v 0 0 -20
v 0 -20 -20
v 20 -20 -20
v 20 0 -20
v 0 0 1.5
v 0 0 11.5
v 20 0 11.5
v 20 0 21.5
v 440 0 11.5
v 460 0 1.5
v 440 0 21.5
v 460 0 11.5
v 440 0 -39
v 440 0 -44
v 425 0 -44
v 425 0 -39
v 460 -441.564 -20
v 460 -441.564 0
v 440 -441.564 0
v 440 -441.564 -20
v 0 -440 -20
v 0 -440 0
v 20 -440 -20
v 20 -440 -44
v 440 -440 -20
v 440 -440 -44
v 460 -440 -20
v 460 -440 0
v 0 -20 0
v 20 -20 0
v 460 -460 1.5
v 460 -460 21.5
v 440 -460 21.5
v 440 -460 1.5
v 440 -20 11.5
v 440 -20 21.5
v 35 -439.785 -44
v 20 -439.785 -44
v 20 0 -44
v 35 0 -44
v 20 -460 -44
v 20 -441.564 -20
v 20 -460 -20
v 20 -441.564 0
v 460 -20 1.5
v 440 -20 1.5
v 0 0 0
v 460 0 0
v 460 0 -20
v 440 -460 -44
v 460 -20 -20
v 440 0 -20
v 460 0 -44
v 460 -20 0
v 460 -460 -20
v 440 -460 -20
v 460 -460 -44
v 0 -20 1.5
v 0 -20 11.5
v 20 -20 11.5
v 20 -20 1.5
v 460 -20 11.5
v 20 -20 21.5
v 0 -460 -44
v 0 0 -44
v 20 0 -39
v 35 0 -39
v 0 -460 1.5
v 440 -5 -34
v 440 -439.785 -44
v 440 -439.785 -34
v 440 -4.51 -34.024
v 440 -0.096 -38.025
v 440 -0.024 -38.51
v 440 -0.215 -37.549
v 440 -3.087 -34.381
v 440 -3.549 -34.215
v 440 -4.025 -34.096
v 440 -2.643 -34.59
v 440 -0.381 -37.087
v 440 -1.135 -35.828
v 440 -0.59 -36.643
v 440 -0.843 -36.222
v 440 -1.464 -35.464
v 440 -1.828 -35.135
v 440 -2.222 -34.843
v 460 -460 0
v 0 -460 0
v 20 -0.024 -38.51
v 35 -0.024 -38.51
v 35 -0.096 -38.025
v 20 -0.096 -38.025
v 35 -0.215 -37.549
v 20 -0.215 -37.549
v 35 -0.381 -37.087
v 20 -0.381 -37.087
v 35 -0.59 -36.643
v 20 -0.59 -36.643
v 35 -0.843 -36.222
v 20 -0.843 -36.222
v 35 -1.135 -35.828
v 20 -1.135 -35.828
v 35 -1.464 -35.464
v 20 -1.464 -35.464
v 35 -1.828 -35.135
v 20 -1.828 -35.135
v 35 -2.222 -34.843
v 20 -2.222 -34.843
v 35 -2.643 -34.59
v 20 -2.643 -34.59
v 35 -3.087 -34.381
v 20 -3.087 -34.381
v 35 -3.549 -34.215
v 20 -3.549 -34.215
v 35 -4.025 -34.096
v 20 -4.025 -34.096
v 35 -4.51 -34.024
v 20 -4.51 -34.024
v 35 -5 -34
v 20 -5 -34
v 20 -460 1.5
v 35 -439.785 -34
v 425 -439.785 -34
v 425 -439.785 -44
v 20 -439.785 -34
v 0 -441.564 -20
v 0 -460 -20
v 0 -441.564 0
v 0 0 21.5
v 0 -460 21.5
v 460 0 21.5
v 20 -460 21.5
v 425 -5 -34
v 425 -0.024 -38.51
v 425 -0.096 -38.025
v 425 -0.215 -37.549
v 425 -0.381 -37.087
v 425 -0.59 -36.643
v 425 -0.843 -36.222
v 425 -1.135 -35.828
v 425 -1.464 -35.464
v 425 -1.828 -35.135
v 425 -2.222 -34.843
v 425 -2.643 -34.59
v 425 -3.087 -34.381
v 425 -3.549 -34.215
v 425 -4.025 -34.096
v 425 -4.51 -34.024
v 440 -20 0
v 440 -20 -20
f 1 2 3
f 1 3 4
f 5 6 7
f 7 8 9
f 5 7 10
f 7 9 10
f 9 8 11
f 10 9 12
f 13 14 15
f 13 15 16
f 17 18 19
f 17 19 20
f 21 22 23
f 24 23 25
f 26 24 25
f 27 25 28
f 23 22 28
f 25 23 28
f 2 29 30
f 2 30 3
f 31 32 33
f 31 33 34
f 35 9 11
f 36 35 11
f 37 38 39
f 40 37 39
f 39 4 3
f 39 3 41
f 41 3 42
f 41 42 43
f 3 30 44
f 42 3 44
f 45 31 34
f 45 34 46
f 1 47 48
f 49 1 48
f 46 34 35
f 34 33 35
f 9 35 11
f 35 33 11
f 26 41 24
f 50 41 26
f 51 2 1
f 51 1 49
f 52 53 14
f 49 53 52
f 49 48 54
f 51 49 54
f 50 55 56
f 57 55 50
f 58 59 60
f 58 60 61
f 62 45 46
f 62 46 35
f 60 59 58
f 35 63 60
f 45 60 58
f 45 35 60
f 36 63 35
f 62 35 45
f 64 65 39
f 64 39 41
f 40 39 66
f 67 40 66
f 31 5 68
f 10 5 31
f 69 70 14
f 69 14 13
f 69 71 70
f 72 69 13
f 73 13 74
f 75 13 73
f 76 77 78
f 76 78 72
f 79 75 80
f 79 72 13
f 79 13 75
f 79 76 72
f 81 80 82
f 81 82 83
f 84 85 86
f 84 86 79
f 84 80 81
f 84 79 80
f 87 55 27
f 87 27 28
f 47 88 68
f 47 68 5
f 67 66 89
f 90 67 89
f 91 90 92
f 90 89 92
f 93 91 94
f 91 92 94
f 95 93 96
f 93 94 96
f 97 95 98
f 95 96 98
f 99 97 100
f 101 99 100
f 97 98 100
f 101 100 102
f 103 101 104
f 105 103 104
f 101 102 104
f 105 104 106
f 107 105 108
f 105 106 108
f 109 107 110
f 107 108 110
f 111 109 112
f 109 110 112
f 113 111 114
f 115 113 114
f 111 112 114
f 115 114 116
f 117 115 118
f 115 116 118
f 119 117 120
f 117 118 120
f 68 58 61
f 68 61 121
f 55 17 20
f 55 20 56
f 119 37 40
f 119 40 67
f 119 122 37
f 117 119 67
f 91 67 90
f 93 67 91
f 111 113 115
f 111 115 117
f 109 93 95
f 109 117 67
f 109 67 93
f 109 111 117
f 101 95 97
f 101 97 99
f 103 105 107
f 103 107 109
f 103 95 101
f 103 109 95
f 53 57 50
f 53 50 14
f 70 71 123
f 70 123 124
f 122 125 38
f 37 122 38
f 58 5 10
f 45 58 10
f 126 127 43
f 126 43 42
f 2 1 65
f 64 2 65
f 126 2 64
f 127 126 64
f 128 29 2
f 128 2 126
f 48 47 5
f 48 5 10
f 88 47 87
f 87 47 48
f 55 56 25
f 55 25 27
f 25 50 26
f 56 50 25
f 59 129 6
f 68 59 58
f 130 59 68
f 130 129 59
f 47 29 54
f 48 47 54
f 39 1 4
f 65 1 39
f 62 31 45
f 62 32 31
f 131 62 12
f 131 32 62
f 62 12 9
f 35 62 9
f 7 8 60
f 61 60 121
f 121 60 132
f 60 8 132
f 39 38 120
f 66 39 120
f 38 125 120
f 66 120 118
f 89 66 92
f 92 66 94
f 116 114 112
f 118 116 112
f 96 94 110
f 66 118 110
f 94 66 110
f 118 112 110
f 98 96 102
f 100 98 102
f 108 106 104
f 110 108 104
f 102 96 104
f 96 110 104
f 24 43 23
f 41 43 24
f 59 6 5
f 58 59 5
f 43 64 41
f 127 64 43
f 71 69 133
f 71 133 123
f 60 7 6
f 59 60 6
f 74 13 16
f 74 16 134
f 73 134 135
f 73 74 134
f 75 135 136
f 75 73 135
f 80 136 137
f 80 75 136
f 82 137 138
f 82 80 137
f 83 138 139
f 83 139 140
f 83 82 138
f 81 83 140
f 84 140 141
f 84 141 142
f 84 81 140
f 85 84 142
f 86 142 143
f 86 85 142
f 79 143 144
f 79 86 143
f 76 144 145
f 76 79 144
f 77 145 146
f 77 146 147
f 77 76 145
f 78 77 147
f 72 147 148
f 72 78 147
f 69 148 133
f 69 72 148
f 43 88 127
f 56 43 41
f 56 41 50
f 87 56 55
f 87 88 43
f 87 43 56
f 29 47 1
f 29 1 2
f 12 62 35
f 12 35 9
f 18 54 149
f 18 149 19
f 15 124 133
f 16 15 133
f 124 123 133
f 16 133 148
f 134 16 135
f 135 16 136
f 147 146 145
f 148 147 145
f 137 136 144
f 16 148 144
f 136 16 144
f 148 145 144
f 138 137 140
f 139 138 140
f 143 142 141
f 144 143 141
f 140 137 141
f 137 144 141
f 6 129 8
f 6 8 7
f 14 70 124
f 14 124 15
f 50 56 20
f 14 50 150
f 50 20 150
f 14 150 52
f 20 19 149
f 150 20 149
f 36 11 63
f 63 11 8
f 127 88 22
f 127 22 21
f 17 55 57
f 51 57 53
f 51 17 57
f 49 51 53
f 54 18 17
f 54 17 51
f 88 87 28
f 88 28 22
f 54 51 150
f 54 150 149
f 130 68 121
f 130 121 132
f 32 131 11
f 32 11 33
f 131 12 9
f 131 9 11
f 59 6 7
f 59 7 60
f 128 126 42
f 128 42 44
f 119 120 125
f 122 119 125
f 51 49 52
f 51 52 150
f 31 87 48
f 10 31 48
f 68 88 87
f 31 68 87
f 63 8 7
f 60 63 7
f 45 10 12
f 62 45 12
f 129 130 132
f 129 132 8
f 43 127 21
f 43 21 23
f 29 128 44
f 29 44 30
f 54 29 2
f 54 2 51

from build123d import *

# Parameters (mm, degrees)
F0_W      = 460
F0_H      = 460
F1_DEPTH  = 1.5
F3_DEPTH  = 20
F5_DEPTH  = 20
F7_DEPTH  = 20
F8_W      = 460
F8_H      = 20
F9_DEPTH  = 20
F11_DEPTH = 20
F13_DEPTH = 20
F15_DEPTH = 20
F19_DEPTH = 15


with BuildPart() as f1:
    # F0 (on Top) → F1 (new body)
    with BuildSketch(Plane.XY):
        with Locations((230, -230)):
            Rectangle(F0_W, F0_H)
    extrude(amount=F1_DEPTH)


with BuildPart() as f3:
    # F2 (on Front) → F3 (new body)
    with BuildSketch(Plane.XZ):
        Polygon((0, 11.5), (0, 1.5), (460, 1.5), (460, 11.5), (440, 11.5), (440, 21.5), (20, 21.5), (20, 11.5), align=None)
    extrude(amount=F3_DEPTH)


with BuildPart() as f5:
    # F4 (on face) → F5 (new body)
    with BuildSketch(Plane(origin=(0, 0, 0), x_dir=(0, -1, 0), z_dir=(-1, 0, 0))):
        Polygon((20, 11.5), (20, 1.5), (460, 1.5), (460, 21.5), (0, 21.5), (0, 11.5), align=None)
    extrude(amount=-F5_DEPTH)


with BuildPart() as f7:
    # F6 (on face) → F7 (new body)
    with BuildSketch(Plane.YZ.offset(460)):
        Polygon((-460, 1.5), (-20, 1.5), (-20, 11.5), (0, 11.5), (0, 21.5), (-460, 21.5), align=None)
    extrude(amount=-F7_DEPTH)


with BuildPart() as f9:
    # F8 (on face) → F9 (new body)
    with BuildSketch(Plane(origin=(0, 0, 0), x_dir=(1, 0, 0), z_dir=(0, 0, -1))):
        with Locations((230, 10)):
            Rectangle(F8_W, F8_H)
    extrude(amount=F9_DEPTH)


with BuildPart() as f11:
    # F10 (on face) → F11 (new body)
    with BuildSketch(Plane(origin=(0, 0, 0), x_dir=(0, -1, 0), z_dir=(-1, 0, 0))):
        Polygon((20, 0), (20, -20), (0, -20), (0, -44), (460, -44), (460, -20), (441.5642023087, -20), (441.5642023087, 0), align=None)
    extrude(amount=-F11_DEPTH)


with BuildPart() as f13:
    # F12 (on face) → F13 (new body)
    with BuildSketch(Plane.YZ.offset(460)):
        Polygon((0, -20), (-20, -20), (-20, 0), (-441.5642023087, 0), (-441.5642023087, -20), (-460, -20), (-460, -44), (0, -44), align=None)
    extrude(amount=-F13_DEPTH)


with BuildPart() as f15:
    # F14 (on face) → F15 (new body)
    with BuildSketch(Plane.XZ.offset(460)):
        Polygon((0, -20), (20, -20), (20, -44), (440, -44), (440, -20), (460, -20), (460, 0), (0, 0), align=None)
    extrude(amount=-F15_DEPTH)


with BuildPart() as f19:
    # F18 (on face) → F19 (new body)
    with BuildSketch(Plane.YZ.offset(20)):
        with BuildLine():
            Line((-439.7849869728, -44), (0, -44))
            Line((0, -44), (0, -39))
            ThreePointArc((0, -39), (-1.4644660941, -35.4644660941), (-5, -34))
            Line((-5, -34), (-439.7849869728, -34))
            Line((-439.7849869728, -34), (-439.7849869728, -44))
        make_face()
    extrude(amount=F19_DEPTH)


with BuildPart() as f20_1:
    # F20: instance of F19
    add(f19.part.mirror(Plane.YZ.offset(230)))


solid = Compound([f1.part, f3.part, f5.part, f7.part, f9.part, f11.part, f13.part, f15.part, f19.part, f20_1.part])
